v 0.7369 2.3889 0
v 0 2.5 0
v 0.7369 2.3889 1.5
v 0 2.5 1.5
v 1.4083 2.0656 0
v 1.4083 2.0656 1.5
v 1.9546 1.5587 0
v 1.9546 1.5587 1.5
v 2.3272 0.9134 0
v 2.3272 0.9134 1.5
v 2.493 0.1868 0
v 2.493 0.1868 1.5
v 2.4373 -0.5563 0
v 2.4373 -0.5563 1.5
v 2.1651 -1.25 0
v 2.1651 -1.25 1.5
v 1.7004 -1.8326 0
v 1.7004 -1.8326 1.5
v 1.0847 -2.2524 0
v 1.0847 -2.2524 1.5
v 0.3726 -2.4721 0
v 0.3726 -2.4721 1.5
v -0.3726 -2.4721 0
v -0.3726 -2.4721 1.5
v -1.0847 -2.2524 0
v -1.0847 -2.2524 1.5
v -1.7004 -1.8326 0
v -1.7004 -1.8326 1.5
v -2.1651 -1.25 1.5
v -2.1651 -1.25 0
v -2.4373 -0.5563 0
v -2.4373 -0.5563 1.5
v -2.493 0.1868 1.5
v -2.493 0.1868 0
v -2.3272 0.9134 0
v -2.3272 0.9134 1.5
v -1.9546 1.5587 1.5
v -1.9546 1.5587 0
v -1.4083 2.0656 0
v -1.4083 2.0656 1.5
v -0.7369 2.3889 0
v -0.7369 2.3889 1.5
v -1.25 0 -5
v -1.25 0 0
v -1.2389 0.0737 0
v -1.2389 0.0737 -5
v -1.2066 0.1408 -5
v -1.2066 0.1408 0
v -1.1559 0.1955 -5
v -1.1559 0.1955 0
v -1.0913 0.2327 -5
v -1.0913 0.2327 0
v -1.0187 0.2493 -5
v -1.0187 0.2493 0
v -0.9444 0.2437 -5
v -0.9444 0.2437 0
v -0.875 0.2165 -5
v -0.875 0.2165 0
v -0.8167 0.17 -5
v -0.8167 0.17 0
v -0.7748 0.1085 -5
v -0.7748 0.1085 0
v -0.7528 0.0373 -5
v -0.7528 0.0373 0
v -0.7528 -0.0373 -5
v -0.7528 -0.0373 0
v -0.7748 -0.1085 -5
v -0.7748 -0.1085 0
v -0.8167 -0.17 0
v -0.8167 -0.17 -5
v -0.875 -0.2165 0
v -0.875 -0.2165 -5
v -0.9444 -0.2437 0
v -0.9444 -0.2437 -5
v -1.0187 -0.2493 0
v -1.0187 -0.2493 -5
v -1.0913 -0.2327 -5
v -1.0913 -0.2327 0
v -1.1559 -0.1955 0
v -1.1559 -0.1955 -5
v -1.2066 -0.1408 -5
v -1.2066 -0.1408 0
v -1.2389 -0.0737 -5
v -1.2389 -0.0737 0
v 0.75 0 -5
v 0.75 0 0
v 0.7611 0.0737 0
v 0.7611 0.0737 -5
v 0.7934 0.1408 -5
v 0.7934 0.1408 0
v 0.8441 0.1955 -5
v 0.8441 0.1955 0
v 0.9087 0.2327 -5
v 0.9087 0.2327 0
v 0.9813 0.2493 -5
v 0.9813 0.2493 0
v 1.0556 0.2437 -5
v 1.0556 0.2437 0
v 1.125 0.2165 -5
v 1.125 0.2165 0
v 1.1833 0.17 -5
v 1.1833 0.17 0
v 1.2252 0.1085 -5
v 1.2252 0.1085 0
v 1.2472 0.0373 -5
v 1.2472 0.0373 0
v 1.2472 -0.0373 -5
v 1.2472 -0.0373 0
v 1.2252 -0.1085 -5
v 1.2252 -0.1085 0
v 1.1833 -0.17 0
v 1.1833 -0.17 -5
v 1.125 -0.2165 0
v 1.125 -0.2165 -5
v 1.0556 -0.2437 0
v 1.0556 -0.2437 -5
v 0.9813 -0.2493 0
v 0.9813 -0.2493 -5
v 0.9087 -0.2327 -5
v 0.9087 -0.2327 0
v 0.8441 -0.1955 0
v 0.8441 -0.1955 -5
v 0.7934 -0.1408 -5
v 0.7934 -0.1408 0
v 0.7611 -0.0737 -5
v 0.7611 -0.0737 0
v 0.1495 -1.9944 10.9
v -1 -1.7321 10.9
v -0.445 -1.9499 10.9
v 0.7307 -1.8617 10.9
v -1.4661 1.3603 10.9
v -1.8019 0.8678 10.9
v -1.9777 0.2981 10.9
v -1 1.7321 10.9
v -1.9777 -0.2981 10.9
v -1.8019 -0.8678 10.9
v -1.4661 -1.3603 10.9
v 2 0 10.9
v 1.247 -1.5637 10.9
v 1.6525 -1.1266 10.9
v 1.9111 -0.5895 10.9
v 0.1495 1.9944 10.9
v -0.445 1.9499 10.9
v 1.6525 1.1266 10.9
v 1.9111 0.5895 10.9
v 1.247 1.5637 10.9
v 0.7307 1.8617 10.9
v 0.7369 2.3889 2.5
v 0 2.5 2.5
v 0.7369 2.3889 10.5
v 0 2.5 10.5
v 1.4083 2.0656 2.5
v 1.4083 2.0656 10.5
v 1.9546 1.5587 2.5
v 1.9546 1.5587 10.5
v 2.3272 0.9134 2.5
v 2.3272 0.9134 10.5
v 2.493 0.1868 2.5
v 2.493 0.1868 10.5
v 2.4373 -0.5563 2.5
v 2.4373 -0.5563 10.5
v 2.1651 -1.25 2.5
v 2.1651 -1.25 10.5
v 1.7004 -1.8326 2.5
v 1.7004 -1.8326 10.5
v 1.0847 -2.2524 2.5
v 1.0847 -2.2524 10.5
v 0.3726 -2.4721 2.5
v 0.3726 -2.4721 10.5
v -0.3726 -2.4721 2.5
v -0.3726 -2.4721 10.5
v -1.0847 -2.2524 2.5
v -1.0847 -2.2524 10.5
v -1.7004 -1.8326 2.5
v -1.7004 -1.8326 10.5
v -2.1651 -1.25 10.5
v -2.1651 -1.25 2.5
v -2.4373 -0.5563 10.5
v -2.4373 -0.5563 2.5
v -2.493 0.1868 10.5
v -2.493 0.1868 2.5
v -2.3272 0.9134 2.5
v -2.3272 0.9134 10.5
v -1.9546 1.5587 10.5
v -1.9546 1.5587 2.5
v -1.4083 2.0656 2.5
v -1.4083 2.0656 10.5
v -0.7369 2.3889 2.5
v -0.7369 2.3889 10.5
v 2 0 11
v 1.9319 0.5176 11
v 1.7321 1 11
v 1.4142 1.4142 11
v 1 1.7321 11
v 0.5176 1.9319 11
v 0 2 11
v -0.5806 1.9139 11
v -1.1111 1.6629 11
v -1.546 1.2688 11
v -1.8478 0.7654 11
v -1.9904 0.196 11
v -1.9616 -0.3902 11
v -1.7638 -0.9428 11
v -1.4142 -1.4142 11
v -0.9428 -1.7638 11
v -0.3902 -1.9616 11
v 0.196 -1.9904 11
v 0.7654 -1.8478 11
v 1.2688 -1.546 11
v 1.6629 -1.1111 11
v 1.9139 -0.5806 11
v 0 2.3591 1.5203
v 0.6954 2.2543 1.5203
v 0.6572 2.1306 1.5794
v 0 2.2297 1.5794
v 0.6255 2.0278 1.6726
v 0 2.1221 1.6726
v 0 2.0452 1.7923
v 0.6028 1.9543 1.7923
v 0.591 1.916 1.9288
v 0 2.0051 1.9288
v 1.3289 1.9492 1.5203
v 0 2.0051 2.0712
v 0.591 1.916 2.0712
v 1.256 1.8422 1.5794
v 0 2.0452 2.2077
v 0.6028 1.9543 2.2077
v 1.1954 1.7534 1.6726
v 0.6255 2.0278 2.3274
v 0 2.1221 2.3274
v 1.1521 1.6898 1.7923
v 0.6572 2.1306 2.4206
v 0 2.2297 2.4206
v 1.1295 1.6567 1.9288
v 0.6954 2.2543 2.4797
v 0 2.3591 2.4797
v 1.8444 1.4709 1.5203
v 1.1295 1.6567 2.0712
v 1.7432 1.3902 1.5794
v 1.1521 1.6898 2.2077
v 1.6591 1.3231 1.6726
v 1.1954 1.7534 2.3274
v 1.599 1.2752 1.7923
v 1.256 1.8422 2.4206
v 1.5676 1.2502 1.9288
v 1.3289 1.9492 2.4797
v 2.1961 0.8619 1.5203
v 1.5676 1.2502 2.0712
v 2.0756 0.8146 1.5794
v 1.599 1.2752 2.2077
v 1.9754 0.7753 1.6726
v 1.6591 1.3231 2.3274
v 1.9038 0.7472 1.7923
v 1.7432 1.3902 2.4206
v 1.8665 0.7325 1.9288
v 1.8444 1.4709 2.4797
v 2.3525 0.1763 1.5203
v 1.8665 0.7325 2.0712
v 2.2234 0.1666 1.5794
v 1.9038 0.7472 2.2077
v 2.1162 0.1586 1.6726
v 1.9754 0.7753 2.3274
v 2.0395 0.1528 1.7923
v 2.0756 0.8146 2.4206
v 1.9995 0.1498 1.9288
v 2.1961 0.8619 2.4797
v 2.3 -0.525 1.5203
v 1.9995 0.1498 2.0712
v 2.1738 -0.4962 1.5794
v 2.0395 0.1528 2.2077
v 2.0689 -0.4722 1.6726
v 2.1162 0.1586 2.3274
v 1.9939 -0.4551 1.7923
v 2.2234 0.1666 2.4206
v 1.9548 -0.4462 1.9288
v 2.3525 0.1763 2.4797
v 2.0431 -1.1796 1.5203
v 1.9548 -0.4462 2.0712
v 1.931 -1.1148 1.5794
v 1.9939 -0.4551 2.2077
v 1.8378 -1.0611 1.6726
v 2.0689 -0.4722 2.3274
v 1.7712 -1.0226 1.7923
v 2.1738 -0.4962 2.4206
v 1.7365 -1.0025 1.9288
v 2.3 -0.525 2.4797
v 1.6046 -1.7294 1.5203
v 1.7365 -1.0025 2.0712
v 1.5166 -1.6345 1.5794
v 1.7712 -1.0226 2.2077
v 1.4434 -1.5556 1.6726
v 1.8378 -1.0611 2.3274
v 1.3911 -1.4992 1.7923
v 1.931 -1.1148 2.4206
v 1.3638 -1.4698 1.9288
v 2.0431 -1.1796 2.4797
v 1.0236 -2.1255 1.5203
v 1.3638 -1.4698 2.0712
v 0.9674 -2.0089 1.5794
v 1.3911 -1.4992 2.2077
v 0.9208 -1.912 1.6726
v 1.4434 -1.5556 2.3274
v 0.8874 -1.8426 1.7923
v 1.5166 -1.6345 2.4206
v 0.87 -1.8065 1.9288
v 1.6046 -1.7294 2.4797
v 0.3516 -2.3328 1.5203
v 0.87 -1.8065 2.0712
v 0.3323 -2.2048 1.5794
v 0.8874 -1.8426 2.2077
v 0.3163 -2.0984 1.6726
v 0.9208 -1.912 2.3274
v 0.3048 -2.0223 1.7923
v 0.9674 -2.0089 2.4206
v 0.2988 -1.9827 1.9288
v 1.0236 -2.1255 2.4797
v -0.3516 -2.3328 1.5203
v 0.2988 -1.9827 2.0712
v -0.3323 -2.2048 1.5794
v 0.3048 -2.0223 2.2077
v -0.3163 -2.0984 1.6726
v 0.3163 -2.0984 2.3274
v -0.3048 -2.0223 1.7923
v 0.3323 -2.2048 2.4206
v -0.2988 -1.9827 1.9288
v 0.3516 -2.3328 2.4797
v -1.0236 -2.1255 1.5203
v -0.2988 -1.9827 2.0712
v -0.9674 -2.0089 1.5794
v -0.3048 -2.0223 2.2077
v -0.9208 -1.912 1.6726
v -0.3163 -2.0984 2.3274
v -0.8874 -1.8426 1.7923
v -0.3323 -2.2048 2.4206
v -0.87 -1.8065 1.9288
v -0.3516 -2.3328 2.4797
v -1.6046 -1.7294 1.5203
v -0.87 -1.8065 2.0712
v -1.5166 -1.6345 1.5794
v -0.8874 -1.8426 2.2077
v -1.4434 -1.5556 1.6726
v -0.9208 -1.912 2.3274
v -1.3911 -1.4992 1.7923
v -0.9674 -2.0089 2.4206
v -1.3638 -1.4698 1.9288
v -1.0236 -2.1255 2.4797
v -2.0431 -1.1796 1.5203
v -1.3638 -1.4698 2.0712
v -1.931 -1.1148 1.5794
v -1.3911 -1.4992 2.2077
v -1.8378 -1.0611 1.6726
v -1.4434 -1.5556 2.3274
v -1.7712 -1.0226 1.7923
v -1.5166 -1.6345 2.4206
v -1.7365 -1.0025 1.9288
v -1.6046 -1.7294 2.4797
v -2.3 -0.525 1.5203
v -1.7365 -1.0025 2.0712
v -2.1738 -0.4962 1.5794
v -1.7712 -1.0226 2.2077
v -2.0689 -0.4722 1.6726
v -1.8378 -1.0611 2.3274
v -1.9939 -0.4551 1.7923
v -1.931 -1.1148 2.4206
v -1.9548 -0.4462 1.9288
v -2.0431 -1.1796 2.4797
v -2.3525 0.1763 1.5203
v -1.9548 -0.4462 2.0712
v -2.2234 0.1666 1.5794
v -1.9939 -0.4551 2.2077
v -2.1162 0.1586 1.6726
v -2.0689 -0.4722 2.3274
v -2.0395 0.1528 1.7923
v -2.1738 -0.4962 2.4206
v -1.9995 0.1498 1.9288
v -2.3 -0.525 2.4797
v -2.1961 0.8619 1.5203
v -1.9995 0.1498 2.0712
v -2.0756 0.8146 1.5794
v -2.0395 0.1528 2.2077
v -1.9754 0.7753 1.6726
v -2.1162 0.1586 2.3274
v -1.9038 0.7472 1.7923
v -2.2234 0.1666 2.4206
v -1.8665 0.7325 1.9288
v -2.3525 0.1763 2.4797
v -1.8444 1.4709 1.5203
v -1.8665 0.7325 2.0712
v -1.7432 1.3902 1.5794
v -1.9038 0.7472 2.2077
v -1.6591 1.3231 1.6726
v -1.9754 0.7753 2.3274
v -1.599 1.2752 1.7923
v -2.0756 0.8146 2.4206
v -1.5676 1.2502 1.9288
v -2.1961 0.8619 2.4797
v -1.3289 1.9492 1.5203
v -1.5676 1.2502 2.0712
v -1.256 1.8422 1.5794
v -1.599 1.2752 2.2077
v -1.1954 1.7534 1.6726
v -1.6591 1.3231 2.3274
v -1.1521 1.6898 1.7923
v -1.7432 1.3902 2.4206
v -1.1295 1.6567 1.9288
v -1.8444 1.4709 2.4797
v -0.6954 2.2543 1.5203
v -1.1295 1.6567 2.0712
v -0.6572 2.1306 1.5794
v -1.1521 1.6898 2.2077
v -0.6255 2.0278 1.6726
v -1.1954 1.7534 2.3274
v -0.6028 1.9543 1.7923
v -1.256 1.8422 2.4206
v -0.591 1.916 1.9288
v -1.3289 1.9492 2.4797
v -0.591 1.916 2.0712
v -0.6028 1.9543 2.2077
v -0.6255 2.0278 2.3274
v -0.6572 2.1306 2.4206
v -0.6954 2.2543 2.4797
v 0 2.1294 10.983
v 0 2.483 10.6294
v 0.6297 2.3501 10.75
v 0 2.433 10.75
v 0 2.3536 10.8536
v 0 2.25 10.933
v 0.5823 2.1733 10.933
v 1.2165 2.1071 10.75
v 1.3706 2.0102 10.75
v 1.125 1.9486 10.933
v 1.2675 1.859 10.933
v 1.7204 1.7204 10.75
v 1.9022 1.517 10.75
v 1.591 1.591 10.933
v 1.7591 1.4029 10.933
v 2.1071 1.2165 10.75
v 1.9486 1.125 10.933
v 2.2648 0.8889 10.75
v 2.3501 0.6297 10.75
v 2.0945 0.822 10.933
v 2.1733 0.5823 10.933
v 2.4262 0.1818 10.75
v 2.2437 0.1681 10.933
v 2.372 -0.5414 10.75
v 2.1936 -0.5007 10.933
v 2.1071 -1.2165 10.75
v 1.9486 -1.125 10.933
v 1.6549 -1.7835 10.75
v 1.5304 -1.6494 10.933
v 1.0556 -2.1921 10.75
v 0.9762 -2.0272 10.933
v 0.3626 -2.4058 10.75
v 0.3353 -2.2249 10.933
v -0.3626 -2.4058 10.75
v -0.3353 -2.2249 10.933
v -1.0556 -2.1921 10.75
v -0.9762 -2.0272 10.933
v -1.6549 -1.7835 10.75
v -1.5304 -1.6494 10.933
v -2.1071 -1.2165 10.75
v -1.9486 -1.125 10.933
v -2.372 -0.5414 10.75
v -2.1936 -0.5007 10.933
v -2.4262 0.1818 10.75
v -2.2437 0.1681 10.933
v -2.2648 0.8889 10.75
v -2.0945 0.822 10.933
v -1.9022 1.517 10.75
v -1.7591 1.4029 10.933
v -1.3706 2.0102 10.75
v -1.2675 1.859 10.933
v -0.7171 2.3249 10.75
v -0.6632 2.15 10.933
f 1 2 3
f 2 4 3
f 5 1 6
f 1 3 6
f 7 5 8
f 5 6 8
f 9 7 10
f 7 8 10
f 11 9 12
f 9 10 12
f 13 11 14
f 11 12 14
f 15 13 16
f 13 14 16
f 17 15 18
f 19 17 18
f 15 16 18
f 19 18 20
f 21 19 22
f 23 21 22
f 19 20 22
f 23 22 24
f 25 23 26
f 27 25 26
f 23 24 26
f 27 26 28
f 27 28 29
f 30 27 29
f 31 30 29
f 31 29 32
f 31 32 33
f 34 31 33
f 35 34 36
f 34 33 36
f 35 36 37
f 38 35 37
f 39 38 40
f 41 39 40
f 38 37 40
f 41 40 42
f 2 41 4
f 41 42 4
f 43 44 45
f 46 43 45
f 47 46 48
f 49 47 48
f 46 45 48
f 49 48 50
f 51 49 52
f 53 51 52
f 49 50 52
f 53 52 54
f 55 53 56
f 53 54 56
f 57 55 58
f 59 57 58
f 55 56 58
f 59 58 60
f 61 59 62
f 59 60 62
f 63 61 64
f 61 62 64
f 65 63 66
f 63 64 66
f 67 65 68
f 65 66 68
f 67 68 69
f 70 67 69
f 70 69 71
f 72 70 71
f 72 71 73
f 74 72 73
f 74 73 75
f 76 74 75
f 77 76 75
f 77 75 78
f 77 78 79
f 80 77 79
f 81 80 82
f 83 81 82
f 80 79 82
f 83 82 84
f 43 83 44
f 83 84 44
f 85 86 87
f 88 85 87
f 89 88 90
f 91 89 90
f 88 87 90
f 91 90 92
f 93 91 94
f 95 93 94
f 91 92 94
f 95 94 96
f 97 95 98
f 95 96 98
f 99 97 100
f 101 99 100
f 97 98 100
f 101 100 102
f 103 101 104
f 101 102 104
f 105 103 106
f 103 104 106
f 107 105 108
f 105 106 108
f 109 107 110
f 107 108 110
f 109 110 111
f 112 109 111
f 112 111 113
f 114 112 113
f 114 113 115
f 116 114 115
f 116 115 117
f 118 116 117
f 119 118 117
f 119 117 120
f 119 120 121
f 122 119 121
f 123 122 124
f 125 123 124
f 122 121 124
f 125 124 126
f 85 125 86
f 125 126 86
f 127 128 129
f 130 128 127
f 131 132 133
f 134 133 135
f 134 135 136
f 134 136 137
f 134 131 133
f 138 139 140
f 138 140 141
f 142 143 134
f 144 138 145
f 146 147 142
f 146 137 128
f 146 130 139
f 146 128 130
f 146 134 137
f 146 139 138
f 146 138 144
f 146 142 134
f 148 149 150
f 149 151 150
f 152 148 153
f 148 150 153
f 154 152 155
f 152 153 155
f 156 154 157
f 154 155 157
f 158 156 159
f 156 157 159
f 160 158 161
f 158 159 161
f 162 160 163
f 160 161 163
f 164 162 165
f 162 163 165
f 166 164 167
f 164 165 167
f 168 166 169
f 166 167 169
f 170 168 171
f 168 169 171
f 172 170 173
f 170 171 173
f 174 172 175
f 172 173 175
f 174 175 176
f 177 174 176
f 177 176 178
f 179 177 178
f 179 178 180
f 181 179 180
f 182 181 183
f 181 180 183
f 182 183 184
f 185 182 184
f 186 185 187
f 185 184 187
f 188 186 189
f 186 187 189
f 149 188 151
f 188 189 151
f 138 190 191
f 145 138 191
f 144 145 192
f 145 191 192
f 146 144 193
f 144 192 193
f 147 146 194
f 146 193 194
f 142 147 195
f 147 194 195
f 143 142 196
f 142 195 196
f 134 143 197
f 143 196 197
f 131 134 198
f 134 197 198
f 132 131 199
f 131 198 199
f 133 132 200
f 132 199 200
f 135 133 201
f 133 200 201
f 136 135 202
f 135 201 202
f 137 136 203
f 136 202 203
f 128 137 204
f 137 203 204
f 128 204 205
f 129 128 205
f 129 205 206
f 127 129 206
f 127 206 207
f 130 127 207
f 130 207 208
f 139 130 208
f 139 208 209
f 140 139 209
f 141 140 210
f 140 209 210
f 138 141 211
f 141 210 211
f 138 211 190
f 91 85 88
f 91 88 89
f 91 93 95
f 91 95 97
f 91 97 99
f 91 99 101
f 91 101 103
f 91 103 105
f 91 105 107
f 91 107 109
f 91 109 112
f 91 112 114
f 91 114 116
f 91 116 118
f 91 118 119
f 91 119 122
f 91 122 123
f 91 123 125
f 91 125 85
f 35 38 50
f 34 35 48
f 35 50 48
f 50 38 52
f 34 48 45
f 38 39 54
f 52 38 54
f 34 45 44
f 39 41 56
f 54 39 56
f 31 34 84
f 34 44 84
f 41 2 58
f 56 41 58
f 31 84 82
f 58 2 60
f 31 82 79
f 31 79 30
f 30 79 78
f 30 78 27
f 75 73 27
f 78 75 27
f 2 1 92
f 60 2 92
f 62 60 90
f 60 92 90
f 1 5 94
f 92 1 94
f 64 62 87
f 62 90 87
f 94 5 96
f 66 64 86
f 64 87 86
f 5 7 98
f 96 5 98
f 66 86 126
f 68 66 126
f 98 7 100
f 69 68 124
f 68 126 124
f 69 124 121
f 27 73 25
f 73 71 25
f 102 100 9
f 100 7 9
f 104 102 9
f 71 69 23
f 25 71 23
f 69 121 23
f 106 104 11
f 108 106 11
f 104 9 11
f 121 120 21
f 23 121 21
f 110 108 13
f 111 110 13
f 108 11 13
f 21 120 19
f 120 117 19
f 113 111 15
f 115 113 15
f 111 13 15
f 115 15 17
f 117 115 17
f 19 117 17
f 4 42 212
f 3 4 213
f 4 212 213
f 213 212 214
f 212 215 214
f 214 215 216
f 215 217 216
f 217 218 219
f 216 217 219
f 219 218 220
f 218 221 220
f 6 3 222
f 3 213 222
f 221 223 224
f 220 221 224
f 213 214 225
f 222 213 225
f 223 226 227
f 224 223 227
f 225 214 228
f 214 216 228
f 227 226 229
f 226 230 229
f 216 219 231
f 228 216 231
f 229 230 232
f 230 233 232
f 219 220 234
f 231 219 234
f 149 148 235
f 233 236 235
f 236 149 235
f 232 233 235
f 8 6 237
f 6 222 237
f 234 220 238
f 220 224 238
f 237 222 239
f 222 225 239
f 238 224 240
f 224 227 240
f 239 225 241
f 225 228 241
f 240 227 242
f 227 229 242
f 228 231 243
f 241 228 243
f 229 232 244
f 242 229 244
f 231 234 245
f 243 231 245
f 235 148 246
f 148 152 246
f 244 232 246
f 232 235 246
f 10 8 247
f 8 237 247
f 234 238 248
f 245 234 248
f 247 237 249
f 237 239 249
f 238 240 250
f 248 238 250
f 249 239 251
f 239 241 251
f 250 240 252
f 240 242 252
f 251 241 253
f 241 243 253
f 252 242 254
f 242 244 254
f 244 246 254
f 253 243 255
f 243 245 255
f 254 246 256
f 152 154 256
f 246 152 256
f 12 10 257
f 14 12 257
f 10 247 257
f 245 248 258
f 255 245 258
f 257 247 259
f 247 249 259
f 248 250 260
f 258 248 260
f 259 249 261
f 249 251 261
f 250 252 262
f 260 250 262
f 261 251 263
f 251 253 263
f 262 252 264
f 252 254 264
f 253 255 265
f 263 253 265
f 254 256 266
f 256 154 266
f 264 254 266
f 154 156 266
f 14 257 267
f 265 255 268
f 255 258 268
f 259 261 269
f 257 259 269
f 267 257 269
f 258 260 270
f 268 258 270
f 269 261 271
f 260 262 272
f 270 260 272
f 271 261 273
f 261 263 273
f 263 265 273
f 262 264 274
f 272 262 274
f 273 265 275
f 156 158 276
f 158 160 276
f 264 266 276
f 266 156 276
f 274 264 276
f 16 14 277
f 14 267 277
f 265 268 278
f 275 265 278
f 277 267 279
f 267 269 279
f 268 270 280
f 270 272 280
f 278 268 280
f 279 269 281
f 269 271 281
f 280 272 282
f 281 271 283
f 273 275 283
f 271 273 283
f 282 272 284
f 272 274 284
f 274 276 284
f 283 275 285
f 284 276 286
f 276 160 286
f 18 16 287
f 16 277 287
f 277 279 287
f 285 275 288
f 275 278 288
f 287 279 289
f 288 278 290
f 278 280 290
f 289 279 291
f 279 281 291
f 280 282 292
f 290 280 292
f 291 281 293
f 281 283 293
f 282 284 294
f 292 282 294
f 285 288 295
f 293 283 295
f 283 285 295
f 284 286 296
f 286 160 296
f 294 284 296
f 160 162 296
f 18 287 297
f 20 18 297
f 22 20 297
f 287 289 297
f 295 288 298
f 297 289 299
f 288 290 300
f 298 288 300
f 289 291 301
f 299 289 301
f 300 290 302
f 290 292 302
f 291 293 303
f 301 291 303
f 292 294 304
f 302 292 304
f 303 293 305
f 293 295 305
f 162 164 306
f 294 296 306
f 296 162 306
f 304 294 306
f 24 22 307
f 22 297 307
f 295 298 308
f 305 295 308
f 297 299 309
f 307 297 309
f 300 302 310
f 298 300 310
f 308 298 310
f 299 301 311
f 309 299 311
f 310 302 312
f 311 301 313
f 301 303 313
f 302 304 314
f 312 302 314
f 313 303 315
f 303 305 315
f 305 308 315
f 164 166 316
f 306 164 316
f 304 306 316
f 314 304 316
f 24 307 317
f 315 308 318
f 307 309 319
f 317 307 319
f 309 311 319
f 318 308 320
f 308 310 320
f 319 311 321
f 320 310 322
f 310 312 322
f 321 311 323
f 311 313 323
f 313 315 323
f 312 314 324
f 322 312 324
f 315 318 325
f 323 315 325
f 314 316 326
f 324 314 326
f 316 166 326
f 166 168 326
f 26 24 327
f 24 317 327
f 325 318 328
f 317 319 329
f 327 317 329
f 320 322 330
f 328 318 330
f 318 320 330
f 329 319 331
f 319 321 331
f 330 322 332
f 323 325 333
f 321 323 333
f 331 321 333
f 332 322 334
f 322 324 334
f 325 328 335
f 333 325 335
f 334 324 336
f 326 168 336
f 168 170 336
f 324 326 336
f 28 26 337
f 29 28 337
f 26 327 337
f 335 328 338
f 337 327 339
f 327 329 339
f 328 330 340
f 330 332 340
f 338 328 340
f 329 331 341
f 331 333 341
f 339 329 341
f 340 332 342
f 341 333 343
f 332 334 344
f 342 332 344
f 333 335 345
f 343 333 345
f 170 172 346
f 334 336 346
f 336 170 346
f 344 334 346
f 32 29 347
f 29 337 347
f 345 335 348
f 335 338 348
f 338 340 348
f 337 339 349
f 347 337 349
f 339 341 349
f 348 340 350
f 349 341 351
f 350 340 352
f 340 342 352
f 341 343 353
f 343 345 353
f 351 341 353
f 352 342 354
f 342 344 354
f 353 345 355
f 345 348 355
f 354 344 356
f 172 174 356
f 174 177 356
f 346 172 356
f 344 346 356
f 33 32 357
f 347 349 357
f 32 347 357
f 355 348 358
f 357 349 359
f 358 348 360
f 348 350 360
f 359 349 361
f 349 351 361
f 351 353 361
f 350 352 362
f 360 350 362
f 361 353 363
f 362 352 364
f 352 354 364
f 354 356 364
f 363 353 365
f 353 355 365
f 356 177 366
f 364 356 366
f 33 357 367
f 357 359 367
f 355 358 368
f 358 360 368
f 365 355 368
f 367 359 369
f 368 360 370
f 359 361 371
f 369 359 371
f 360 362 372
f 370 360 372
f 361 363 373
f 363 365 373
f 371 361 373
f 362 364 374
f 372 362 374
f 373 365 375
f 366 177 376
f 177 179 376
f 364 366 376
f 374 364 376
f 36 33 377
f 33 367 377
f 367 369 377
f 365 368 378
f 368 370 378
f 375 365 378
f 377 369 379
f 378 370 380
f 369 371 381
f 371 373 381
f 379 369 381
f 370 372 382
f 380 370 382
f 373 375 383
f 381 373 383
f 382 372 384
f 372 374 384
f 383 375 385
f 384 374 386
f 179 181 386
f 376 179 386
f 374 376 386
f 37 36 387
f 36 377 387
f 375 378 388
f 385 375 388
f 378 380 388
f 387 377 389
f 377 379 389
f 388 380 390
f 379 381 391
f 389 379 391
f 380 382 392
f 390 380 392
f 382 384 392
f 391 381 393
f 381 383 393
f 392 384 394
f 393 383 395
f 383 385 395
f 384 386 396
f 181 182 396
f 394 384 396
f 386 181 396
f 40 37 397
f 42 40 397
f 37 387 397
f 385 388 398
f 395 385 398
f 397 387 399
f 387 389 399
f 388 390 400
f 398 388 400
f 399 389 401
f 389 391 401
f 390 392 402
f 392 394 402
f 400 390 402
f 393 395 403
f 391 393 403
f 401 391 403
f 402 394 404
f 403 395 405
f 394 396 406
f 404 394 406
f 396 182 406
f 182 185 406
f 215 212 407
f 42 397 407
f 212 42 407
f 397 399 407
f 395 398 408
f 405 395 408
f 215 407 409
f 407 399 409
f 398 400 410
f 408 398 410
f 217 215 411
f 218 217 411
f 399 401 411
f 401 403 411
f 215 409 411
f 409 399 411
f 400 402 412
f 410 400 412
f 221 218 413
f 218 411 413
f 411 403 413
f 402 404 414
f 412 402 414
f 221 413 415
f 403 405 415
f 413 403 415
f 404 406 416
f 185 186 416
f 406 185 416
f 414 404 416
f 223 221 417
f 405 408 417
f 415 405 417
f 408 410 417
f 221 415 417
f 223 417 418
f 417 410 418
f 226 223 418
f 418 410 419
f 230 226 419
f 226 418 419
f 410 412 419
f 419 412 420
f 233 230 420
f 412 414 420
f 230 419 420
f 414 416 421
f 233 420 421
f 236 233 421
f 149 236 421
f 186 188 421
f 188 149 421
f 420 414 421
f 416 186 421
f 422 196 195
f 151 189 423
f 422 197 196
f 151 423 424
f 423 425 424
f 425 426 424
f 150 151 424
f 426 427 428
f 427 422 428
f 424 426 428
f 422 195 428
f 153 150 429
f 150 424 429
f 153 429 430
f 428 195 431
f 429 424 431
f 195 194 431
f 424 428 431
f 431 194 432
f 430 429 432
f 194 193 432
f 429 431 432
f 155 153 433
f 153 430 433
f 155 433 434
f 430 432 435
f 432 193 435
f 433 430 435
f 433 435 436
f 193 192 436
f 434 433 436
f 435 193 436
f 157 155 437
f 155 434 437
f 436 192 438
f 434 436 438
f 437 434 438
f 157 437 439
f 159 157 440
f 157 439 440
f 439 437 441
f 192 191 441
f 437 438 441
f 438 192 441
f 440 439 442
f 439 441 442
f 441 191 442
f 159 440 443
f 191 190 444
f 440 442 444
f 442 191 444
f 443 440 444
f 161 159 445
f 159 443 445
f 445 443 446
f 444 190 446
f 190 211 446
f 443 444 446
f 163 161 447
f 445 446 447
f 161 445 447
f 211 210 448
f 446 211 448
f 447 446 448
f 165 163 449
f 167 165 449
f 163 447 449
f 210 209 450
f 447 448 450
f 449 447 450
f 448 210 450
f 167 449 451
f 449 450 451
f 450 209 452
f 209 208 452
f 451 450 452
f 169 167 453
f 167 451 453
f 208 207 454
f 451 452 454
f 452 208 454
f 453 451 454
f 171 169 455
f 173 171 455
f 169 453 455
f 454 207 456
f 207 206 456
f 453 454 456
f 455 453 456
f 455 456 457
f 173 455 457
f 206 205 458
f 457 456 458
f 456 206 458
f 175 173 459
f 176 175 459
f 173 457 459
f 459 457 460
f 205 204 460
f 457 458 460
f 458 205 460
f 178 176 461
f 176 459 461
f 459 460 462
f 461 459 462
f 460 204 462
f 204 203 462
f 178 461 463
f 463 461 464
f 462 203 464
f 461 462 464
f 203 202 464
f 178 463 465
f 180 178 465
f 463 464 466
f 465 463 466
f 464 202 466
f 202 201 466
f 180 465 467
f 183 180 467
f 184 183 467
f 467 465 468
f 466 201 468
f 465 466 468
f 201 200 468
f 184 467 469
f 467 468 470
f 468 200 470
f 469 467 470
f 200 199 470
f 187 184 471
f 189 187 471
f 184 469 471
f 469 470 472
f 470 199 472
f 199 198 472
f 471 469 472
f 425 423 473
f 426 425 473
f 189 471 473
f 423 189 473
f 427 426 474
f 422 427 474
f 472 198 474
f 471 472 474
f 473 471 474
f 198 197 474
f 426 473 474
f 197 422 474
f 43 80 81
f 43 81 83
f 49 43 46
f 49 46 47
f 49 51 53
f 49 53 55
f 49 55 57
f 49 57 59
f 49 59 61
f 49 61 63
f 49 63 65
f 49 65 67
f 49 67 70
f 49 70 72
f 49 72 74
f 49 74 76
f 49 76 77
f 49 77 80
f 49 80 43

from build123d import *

# Parameters (mm, degrees)
SKETCH3_R           = 2
CUT_EXTRUDE1_DEPTH  = 0.1
SKETCH4_R           = 0.25
BOSS_EXTRUDE1_DEPTH = 5


with BuildPart() as part:
    # Sketch2 → Base-Revolve (revolve)
    with BuildSketch(Plane(origin=(0, 0, 0), x_dir=(0, 0, -1), z_dir=(1, 0, 0))):
        with BuildLine():
            Line((0, 0), (0, 2.5))
            Line((0, 2.5), (-1.5, 2.5))
            ThreePointArc((-1.5, 2.5), (-2, 2), (-2.5, 2.5))
            Line((-2.5, 2.5), (-10.5, 2.5))
            ThreePointArc((-10.5, 2.5), (-10.853553391, 2.353553391), (-11, 2))
            Line((-11, 2), (-11, 0))
            Line((-11, 0), (0, 0))
        make_face()
    revolve(axis=Axis((0, 0, 11), (0, 0, -1)))

    # Sketch3 → Cut-Extrude1 (cut)
    with BuildSketch(Plane.XY.offset(11)):
        Circle(SKETCH3_R)
    extrude(amount=-CUT_EXTRUDE1_DEPTH, mode=Mode.SUBTRACT)

    # Sketch4 → Boss-Extrude1 (add)
    with BuildSketch(Plane(origin=(0, 0, 0), x_dir=(-1, 0, 0), z_dir=(0, 0, -1))):
        with Locations((1, 0)):
            Circle(SKETCH4_R)
        with Locations((-1, 0)):
            Circle(SKETCH4_R)
    extrude(amount=BOSS_EXTRUDE1_DEPTH)


solid = part.part
